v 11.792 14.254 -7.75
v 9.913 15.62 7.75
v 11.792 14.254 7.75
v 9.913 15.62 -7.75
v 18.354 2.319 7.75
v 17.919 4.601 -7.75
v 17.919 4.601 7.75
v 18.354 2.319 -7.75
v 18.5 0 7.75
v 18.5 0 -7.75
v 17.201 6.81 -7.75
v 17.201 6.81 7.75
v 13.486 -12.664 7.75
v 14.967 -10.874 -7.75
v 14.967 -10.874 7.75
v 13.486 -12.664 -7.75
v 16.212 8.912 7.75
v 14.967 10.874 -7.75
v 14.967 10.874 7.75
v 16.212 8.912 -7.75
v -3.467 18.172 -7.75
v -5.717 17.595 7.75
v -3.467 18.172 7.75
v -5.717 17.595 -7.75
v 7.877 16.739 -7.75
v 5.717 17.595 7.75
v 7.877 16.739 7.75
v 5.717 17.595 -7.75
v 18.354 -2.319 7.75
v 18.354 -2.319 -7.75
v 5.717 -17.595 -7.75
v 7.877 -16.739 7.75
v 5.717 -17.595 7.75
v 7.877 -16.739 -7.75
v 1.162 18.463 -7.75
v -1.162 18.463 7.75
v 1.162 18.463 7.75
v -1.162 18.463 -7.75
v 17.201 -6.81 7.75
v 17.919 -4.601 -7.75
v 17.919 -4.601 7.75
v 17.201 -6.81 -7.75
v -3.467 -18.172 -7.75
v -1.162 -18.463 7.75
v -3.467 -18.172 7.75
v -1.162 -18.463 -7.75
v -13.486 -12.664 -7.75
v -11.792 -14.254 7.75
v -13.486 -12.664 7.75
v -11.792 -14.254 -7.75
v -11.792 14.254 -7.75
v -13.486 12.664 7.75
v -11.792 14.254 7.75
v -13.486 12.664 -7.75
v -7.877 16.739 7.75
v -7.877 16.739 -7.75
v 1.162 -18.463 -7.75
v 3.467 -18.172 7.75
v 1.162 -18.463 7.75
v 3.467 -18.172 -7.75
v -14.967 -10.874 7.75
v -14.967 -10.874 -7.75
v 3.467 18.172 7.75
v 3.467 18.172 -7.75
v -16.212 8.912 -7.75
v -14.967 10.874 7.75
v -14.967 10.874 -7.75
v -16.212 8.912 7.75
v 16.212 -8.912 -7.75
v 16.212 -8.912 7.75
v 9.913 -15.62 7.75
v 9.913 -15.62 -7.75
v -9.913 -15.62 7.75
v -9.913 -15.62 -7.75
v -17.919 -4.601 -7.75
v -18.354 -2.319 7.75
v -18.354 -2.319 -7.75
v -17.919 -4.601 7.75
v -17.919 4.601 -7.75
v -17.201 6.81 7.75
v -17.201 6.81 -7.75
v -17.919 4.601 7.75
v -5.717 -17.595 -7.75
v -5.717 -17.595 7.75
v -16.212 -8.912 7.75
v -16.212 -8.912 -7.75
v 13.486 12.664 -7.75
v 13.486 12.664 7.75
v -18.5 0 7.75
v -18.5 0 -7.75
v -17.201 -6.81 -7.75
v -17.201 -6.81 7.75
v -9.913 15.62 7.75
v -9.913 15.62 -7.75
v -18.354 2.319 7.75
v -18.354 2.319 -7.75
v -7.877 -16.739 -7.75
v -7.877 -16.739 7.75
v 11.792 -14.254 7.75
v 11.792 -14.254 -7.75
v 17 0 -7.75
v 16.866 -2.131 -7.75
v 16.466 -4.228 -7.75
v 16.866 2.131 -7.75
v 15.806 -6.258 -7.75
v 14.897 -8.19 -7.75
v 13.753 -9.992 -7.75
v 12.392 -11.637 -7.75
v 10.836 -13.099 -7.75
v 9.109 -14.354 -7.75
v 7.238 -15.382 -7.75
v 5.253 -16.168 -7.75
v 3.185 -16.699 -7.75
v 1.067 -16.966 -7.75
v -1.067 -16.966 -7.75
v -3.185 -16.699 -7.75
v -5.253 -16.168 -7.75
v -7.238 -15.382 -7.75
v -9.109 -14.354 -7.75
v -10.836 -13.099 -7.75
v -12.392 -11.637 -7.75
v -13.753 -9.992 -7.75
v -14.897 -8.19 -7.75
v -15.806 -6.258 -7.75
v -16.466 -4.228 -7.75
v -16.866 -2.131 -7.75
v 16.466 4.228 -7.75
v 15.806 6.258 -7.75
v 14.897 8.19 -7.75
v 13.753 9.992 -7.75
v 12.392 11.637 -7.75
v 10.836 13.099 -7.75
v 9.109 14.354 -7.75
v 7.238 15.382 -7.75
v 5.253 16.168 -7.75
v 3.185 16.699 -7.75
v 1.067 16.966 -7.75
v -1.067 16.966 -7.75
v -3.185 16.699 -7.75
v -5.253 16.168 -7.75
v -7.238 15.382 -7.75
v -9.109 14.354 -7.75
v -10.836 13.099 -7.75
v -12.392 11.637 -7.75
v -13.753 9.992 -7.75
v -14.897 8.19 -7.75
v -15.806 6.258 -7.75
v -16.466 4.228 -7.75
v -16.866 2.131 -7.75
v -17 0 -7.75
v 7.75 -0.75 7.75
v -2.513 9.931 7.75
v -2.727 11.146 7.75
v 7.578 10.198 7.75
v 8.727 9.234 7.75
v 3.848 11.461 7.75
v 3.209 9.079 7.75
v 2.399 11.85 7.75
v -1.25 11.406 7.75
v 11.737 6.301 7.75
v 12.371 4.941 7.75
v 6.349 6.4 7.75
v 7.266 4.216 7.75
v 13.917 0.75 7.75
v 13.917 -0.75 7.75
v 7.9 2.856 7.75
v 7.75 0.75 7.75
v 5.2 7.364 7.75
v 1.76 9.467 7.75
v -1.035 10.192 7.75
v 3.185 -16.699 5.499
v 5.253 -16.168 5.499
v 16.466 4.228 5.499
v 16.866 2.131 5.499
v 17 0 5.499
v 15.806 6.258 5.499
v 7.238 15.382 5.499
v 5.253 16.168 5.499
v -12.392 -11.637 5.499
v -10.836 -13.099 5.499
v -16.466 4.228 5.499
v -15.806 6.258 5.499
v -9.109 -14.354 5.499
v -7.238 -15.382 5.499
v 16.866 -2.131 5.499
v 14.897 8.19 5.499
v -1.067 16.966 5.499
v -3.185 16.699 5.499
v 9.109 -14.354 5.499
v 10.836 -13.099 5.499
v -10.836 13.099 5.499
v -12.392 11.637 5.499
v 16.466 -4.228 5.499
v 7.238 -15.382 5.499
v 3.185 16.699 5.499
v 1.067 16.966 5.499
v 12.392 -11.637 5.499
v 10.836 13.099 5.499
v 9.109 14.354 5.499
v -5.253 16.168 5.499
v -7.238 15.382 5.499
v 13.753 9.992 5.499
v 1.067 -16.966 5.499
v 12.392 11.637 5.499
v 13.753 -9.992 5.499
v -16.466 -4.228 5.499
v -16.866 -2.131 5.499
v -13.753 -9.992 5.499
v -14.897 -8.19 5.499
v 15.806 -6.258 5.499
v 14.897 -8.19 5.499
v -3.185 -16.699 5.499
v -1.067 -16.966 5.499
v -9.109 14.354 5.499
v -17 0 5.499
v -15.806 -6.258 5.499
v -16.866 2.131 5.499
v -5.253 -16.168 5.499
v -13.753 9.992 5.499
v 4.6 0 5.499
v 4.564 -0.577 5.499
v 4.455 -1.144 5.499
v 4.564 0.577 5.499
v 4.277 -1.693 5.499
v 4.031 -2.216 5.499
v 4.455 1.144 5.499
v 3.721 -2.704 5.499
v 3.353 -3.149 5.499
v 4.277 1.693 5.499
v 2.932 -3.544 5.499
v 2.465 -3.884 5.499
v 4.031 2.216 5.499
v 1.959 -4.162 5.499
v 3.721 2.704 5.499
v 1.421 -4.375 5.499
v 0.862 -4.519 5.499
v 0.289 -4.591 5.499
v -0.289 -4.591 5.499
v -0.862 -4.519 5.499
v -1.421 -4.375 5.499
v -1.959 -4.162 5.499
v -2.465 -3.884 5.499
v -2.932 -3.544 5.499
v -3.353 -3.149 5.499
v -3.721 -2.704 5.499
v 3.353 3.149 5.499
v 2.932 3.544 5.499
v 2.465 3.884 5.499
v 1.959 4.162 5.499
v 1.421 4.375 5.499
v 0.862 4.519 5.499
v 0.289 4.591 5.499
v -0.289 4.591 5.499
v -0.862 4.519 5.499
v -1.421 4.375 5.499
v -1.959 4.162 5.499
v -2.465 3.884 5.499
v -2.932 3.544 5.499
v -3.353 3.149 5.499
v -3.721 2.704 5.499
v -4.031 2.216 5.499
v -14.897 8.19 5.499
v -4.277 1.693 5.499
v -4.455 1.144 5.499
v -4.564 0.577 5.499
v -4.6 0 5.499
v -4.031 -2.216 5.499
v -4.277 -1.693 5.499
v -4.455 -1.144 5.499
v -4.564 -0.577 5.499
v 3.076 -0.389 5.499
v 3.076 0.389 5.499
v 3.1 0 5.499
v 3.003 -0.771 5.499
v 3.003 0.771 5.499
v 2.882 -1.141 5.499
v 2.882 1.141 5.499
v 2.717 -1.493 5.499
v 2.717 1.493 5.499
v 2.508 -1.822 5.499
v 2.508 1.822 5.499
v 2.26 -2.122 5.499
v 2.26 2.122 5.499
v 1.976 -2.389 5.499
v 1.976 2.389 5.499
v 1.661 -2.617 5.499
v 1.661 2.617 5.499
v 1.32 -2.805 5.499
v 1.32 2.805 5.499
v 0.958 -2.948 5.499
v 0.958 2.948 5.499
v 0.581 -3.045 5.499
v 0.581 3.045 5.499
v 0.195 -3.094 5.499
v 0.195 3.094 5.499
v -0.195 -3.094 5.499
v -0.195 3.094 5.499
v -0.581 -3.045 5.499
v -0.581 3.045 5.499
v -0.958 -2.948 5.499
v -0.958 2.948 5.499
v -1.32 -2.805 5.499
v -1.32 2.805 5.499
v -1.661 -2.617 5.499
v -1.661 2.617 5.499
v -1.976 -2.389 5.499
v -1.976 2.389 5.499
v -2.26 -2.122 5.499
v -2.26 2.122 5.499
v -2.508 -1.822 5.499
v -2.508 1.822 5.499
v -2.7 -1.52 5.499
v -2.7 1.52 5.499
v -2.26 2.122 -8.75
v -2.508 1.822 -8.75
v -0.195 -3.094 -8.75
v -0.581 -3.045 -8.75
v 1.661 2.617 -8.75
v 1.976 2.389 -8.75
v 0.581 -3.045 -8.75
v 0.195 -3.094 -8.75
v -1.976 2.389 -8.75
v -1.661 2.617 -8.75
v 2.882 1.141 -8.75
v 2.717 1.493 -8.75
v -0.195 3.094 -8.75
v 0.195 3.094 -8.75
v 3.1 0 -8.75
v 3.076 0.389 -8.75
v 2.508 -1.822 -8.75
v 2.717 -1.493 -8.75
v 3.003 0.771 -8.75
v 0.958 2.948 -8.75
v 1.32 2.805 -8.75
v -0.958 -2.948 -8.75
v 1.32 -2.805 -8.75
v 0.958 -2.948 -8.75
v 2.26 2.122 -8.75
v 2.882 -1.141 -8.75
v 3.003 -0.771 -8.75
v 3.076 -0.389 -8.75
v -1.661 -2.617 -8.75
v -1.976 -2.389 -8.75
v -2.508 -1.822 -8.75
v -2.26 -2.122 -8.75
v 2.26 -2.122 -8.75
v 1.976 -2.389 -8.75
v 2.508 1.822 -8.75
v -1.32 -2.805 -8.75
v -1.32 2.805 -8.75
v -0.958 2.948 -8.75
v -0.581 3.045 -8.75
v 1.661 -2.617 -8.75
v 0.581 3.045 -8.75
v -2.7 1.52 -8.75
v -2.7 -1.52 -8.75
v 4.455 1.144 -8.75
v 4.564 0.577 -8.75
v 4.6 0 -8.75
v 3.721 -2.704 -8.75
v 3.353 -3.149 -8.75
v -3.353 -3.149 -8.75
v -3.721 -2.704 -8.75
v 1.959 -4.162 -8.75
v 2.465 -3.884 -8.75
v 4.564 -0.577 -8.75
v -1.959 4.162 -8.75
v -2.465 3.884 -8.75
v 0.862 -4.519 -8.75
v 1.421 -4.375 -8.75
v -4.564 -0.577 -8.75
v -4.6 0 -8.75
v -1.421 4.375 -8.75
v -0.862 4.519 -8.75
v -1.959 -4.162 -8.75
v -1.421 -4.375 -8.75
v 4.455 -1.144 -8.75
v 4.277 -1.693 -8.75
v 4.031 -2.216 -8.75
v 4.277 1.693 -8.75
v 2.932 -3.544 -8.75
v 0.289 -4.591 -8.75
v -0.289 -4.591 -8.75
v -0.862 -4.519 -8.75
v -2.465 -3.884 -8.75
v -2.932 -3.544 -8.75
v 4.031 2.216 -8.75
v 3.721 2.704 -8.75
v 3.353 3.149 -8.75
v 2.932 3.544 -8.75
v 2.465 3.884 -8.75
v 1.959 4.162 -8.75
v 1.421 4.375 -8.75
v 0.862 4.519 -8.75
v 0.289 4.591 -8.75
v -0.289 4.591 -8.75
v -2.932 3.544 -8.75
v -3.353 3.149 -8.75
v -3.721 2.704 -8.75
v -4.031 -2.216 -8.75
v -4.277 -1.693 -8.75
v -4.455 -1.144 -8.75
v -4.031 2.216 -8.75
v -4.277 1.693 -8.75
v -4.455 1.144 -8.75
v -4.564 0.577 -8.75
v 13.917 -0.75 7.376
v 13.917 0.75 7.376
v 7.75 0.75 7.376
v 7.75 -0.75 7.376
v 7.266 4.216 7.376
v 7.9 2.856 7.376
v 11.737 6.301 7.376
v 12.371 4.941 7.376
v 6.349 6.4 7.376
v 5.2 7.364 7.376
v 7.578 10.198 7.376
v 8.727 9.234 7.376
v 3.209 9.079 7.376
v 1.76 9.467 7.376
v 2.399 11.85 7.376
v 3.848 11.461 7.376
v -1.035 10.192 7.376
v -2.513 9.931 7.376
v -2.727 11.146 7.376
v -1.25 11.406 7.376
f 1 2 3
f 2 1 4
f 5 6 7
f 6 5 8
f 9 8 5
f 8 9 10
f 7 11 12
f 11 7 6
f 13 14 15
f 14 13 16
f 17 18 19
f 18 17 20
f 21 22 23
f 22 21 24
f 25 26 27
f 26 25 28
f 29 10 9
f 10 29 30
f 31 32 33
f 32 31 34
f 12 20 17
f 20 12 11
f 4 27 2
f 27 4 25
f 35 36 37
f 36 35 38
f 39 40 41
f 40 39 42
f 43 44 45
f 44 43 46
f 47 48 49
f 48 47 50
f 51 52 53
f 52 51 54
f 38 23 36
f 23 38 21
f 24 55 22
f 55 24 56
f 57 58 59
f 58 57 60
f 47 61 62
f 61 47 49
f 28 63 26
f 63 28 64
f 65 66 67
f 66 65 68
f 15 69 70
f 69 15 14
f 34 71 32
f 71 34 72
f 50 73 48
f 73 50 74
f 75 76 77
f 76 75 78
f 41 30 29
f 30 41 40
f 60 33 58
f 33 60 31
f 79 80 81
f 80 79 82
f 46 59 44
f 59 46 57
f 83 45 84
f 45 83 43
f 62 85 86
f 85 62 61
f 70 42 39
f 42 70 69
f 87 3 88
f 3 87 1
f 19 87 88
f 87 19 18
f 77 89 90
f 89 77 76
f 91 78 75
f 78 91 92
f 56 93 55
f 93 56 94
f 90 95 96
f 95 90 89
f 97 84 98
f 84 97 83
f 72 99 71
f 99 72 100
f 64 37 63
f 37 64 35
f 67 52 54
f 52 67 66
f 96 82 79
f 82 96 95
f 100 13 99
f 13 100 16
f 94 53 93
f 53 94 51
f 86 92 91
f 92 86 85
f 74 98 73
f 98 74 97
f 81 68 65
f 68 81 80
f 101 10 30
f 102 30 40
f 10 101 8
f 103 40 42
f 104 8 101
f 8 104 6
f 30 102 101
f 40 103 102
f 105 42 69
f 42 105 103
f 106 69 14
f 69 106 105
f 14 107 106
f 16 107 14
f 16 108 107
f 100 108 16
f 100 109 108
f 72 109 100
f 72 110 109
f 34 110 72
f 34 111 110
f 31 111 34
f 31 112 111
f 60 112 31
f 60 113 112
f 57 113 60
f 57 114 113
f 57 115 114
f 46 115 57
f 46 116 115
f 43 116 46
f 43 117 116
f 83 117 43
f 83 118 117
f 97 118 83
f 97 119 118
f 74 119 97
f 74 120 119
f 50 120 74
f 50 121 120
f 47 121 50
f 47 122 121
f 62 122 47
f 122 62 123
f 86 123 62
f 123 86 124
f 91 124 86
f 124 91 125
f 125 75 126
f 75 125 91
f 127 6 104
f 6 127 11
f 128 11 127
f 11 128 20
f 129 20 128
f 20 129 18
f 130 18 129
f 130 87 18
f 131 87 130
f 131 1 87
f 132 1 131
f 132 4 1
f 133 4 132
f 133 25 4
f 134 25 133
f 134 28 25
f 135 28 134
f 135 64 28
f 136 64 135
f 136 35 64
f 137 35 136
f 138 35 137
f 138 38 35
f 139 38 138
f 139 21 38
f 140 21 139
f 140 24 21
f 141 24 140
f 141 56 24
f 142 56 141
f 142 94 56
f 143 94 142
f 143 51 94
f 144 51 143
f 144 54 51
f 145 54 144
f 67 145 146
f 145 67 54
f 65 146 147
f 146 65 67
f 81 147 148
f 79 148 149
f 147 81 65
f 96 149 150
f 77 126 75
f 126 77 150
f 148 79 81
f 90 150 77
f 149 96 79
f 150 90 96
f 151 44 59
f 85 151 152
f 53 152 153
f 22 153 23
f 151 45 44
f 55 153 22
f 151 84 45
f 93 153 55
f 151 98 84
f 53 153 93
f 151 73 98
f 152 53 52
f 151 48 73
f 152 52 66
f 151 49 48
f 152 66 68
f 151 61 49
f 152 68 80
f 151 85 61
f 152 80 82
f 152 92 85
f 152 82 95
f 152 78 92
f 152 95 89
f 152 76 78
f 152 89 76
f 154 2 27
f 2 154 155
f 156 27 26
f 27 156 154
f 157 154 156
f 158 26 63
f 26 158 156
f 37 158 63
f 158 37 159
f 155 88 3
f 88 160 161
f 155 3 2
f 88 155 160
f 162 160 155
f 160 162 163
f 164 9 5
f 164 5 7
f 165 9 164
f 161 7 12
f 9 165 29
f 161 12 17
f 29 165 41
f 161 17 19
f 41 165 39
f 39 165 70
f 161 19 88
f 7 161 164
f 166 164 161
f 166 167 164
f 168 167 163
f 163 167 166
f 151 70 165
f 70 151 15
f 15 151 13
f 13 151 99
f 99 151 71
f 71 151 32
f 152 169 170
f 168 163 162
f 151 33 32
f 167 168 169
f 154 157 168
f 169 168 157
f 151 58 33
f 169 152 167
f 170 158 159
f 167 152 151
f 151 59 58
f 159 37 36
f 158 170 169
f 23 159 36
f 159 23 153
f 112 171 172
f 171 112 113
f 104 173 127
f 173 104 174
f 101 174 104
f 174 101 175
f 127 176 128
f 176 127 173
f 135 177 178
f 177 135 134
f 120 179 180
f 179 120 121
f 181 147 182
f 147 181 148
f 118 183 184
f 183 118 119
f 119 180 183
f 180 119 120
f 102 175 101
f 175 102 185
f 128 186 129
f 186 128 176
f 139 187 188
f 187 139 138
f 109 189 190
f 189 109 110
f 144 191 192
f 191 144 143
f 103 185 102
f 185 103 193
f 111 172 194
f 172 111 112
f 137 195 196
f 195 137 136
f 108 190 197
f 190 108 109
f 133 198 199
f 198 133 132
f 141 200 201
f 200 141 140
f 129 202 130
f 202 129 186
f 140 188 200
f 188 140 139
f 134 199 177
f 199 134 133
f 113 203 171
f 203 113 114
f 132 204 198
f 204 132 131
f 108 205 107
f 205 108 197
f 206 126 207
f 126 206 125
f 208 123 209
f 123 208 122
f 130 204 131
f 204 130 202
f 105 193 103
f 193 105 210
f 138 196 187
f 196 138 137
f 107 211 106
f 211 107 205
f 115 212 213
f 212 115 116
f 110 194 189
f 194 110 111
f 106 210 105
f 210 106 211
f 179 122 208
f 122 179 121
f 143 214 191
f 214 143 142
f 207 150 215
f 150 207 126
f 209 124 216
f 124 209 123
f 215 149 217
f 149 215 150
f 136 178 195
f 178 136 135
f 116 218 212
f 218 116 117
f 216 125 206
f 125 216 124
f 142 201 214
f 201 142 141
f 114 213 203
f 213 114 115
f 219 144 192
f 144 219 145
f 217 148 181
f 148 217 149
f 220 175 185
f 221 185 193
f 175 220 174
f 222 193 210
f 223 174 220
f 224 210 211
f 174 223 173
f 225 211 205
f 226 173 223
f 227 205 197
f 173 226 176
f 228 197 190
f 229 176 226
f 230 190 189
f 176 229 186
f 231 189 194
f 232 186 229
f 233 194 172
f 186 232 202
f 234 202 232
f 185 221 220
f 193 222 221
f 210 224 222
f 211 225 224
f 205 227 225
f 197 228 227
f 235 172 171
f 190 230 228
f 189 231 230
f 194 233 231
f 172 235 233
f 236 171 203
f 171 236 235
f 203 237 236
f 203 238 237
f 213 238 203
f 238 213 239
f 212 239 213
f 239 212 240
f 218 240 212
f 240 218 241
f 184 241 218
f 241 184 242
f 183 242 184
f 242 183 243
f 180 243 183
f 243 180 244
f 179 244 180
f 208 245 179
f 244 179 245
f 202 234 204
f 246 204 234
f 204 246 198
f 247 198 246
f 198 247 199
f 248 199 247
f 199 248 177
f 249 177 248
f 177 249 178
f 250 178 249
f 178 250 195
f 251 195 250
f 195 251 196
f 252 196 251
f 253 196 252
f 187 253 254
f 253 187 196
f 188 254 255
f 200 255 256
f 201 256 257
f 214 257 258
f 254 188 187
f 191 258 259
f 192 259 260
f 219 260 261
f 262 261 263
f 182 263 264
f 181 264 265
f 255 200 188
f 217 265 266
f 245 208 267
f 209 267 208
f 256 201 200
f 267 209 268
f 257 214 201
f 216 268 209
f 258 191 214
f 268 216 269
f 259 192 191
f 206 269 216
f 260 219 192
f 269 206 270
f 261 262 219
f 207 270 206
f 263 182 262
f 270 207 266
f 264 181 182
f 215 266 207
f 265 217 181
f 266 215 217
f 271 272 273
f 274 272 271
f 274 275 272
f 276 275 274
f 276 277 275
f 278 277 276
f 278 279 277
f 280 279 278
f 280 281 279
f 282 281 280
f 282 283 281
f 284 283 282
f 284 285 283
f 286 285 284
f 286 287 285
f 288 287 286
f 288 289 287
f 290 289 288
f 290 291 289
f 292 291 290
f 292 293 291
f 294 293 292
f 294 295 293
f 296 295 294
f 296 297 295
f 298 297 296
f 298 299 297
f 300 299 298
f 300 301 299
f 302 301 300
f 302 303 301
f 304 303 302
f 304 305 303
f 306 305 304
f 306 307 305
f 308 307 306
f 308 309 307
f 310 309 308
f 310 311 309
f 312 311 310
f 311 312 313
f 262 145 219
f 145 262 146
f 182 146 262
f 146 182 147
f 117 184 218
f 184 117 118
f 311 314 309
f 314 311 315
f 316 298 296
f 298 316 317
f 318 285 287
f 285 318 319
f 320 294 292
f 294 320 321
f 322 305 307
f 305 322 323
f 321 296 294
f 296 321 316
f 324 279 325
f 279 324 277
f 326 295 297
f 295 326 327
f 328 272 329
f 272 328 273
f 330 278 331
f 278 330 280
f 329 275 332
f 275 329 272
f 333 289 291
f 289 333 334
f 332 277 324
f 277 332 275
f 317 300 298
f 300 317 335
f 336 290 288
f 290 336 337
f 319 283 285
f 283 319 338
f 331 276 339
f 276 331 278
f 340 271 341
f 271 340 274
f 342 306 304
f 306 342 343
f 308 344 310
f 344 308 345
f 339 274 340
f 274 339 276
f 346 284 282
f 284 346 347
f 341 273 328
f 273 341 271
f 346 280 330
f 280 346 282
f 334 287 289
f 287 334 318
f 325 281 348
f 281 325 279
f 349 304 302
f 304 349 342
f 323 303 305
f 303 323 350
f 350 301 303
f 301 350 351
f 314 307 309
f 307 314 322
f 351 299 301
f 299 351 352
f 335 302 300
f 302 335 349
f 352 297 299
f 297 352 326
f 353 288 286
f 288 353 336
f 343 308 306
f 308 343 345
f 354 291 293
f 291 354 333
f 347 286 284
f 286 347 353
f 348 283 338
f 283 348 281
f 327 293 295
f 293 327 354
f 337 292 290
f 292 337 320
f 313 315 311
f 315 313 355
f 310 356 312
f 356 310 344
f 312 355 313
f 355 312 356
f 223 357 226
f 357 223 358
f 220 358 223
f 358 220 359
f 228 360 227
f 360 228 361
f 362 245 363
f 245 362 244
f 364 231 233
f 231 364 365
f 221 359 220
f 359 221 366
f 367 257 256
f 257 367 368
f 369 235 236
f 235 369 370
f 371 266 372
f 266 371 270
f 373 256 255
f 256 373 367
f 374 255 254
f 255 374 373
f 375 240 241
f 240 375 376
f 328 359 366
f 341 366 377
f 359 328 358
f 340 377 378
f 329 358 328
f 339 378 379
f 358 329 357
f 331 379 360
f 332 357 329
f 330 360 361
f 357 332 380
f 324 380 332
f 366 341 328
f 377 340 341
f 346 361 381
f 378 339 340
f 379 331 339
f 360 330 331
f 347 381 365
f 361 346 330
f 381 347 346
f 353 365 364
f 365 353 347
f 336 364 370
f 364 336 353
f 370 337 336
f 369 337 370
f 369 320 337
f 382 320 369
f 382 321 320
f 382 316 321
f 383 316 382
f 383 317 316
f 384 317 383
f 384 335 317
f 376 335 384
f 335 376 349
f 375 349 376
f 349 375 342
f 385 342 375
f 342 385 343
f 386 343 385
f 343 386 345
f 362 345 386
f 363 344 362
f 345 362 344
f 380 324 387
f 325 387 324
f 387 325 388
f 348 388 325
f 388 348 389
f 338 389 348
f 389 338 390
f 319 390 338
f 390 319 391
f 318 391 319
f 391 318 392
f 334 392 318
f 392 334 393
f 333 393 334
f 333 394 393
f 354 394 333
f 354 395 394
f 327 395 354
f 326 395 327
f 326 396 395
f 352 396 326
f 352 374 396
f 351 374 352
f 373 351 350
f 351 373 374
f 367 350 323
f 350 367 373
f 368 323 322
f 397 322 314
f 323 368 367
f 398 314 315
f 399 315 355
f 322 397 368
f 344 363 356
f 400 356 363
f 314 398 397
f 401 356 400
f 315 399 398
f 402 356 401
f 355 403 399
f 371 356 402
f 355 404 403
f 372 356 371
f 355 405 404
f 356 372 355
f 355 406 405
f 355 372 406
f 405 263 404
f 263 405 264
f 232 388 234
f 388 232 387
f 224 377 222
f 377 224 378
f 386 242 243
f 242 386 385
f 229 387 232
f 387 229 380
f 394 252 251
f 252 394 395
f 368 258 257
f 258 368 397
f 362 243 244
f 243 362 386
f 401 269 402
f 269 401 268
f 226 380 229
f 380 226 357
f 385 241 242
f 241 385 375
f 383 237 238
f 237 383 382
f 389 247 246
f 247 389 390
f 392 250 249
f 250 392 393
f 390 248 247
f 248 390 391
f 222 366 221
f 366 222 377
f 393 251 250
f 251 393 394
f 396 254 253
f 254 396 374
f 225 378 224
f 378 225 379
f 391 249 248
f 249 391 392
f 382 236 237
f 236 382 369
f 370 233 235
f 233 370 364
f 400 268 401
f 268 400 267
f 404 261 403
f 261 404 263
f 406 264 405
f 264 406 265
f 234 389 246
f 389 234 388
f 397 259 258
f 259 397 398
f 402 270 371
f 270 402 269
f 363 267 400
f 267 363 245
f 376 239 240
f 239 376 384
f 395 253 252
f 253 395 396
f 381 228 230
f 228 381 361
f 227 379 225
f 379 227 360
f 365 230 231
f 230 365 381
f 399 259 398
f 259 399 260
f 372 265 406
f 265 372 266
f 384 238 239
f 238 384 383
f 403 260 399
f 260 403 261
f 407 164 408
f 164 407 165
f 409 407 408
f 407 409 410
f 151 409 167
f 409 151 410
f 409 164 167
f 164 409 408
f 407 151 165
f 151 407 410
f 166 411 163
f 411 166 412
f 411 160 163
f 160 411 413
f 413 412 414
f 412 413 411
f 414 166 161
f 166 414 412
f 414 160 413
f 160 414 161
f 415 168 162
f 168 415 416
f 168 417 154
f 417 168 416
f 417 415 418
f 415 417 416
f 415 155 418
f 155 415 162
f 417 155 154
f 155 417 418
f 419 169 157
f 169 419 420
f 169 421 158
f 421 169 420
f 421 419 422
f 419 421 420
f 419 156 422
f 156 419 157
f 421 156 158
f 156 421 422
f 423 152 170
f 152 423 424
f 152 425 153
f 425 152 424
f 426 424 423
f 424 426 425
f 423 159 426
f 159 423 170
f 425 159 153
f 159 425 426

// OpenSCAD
// This work is licensed under a Creative Commons Attribution-ShareAlike 4.0
// International License (http://creativecommons.org/licenses/by-sa/4.0/)

KnobDiameter = 37;
KnobHeight = 15.5;
KnobWall = 1.5;

HoleDiameter = 6.2;
HoleFlatThickness = 0.4;
HoleWall = 1.5;
HoleDepth = 14.4;
ShaftExtraLength = 1; // can be negative
SplitShaft = 0;

Pointer = 1;
PointerMarksCount = 5;
PointerMarksStartDegrees = 0;
PointerMarksClockwise = 1;

module __customizer_limit__() {}

$fn=50;

module knob() {
    difference() {
        cylinder(h=KnobHeight, d=KnobDiameter, center=true);
        
        translate([0, 0, - KnobWall - 0.001])
            cylinder(h=KnobHeight - KnobWall, d=KnobDiameter - 2 * KnobWall, center=true);
    }
}

module shaft() {
    Height = KnobHeight + ShaftExtraLength;
    translate([0, 0, -ShaftExtraLength/2])
        difference() {
            cylinder(h=Height, d=HoleDiameter + 2 * HoleWall, center=true);
            translate([0, 0, -(Height - HoleDepth)/2 - 0.001])
                union() {
                    difference() {
                        cylinder(h=HoleDepth, d=HoleDiameter, center=true);
                        translate([-HoleDiameter/2 + HoleFlatThickness/2, 0, 0])
                            cube([HoleFlatThickness, HoleDiameter + 0.001, HoleDepth + 0.001], center=true);
                    }
                    if(SplitShaft == 1) {
                        translate([HoleDiameter/2, 0, 0])
                            cube([HoleWall*2, HoleWall, HoleDepth], center=true);
                    }
                }
    }
}

module mark(size) {
    translate([KnobDiameter*2/6 - KnobWall, 0, KnobHeight/2 + 0.001])
        cube([KnobDiameter/6 * size, KnobWall, KnobWall/2], center=true);
}

module pointer() {
    marks_count = max(1, PointerMarksCount);
    size_step = 1.0 / marks_count;
    direction = PointerMarksClockwise * 2 - 1;
    for (i = [0:marks_count-1]) {
        rotate([0, 0, -PointerMarksStartDegrees + direction * 25 * i]) mark(1.0 - size_step * i);
    }
}

difference() {
    union() {
        knob();
        shaft();
    }
    if (Pointer == 1) pointer();
}
